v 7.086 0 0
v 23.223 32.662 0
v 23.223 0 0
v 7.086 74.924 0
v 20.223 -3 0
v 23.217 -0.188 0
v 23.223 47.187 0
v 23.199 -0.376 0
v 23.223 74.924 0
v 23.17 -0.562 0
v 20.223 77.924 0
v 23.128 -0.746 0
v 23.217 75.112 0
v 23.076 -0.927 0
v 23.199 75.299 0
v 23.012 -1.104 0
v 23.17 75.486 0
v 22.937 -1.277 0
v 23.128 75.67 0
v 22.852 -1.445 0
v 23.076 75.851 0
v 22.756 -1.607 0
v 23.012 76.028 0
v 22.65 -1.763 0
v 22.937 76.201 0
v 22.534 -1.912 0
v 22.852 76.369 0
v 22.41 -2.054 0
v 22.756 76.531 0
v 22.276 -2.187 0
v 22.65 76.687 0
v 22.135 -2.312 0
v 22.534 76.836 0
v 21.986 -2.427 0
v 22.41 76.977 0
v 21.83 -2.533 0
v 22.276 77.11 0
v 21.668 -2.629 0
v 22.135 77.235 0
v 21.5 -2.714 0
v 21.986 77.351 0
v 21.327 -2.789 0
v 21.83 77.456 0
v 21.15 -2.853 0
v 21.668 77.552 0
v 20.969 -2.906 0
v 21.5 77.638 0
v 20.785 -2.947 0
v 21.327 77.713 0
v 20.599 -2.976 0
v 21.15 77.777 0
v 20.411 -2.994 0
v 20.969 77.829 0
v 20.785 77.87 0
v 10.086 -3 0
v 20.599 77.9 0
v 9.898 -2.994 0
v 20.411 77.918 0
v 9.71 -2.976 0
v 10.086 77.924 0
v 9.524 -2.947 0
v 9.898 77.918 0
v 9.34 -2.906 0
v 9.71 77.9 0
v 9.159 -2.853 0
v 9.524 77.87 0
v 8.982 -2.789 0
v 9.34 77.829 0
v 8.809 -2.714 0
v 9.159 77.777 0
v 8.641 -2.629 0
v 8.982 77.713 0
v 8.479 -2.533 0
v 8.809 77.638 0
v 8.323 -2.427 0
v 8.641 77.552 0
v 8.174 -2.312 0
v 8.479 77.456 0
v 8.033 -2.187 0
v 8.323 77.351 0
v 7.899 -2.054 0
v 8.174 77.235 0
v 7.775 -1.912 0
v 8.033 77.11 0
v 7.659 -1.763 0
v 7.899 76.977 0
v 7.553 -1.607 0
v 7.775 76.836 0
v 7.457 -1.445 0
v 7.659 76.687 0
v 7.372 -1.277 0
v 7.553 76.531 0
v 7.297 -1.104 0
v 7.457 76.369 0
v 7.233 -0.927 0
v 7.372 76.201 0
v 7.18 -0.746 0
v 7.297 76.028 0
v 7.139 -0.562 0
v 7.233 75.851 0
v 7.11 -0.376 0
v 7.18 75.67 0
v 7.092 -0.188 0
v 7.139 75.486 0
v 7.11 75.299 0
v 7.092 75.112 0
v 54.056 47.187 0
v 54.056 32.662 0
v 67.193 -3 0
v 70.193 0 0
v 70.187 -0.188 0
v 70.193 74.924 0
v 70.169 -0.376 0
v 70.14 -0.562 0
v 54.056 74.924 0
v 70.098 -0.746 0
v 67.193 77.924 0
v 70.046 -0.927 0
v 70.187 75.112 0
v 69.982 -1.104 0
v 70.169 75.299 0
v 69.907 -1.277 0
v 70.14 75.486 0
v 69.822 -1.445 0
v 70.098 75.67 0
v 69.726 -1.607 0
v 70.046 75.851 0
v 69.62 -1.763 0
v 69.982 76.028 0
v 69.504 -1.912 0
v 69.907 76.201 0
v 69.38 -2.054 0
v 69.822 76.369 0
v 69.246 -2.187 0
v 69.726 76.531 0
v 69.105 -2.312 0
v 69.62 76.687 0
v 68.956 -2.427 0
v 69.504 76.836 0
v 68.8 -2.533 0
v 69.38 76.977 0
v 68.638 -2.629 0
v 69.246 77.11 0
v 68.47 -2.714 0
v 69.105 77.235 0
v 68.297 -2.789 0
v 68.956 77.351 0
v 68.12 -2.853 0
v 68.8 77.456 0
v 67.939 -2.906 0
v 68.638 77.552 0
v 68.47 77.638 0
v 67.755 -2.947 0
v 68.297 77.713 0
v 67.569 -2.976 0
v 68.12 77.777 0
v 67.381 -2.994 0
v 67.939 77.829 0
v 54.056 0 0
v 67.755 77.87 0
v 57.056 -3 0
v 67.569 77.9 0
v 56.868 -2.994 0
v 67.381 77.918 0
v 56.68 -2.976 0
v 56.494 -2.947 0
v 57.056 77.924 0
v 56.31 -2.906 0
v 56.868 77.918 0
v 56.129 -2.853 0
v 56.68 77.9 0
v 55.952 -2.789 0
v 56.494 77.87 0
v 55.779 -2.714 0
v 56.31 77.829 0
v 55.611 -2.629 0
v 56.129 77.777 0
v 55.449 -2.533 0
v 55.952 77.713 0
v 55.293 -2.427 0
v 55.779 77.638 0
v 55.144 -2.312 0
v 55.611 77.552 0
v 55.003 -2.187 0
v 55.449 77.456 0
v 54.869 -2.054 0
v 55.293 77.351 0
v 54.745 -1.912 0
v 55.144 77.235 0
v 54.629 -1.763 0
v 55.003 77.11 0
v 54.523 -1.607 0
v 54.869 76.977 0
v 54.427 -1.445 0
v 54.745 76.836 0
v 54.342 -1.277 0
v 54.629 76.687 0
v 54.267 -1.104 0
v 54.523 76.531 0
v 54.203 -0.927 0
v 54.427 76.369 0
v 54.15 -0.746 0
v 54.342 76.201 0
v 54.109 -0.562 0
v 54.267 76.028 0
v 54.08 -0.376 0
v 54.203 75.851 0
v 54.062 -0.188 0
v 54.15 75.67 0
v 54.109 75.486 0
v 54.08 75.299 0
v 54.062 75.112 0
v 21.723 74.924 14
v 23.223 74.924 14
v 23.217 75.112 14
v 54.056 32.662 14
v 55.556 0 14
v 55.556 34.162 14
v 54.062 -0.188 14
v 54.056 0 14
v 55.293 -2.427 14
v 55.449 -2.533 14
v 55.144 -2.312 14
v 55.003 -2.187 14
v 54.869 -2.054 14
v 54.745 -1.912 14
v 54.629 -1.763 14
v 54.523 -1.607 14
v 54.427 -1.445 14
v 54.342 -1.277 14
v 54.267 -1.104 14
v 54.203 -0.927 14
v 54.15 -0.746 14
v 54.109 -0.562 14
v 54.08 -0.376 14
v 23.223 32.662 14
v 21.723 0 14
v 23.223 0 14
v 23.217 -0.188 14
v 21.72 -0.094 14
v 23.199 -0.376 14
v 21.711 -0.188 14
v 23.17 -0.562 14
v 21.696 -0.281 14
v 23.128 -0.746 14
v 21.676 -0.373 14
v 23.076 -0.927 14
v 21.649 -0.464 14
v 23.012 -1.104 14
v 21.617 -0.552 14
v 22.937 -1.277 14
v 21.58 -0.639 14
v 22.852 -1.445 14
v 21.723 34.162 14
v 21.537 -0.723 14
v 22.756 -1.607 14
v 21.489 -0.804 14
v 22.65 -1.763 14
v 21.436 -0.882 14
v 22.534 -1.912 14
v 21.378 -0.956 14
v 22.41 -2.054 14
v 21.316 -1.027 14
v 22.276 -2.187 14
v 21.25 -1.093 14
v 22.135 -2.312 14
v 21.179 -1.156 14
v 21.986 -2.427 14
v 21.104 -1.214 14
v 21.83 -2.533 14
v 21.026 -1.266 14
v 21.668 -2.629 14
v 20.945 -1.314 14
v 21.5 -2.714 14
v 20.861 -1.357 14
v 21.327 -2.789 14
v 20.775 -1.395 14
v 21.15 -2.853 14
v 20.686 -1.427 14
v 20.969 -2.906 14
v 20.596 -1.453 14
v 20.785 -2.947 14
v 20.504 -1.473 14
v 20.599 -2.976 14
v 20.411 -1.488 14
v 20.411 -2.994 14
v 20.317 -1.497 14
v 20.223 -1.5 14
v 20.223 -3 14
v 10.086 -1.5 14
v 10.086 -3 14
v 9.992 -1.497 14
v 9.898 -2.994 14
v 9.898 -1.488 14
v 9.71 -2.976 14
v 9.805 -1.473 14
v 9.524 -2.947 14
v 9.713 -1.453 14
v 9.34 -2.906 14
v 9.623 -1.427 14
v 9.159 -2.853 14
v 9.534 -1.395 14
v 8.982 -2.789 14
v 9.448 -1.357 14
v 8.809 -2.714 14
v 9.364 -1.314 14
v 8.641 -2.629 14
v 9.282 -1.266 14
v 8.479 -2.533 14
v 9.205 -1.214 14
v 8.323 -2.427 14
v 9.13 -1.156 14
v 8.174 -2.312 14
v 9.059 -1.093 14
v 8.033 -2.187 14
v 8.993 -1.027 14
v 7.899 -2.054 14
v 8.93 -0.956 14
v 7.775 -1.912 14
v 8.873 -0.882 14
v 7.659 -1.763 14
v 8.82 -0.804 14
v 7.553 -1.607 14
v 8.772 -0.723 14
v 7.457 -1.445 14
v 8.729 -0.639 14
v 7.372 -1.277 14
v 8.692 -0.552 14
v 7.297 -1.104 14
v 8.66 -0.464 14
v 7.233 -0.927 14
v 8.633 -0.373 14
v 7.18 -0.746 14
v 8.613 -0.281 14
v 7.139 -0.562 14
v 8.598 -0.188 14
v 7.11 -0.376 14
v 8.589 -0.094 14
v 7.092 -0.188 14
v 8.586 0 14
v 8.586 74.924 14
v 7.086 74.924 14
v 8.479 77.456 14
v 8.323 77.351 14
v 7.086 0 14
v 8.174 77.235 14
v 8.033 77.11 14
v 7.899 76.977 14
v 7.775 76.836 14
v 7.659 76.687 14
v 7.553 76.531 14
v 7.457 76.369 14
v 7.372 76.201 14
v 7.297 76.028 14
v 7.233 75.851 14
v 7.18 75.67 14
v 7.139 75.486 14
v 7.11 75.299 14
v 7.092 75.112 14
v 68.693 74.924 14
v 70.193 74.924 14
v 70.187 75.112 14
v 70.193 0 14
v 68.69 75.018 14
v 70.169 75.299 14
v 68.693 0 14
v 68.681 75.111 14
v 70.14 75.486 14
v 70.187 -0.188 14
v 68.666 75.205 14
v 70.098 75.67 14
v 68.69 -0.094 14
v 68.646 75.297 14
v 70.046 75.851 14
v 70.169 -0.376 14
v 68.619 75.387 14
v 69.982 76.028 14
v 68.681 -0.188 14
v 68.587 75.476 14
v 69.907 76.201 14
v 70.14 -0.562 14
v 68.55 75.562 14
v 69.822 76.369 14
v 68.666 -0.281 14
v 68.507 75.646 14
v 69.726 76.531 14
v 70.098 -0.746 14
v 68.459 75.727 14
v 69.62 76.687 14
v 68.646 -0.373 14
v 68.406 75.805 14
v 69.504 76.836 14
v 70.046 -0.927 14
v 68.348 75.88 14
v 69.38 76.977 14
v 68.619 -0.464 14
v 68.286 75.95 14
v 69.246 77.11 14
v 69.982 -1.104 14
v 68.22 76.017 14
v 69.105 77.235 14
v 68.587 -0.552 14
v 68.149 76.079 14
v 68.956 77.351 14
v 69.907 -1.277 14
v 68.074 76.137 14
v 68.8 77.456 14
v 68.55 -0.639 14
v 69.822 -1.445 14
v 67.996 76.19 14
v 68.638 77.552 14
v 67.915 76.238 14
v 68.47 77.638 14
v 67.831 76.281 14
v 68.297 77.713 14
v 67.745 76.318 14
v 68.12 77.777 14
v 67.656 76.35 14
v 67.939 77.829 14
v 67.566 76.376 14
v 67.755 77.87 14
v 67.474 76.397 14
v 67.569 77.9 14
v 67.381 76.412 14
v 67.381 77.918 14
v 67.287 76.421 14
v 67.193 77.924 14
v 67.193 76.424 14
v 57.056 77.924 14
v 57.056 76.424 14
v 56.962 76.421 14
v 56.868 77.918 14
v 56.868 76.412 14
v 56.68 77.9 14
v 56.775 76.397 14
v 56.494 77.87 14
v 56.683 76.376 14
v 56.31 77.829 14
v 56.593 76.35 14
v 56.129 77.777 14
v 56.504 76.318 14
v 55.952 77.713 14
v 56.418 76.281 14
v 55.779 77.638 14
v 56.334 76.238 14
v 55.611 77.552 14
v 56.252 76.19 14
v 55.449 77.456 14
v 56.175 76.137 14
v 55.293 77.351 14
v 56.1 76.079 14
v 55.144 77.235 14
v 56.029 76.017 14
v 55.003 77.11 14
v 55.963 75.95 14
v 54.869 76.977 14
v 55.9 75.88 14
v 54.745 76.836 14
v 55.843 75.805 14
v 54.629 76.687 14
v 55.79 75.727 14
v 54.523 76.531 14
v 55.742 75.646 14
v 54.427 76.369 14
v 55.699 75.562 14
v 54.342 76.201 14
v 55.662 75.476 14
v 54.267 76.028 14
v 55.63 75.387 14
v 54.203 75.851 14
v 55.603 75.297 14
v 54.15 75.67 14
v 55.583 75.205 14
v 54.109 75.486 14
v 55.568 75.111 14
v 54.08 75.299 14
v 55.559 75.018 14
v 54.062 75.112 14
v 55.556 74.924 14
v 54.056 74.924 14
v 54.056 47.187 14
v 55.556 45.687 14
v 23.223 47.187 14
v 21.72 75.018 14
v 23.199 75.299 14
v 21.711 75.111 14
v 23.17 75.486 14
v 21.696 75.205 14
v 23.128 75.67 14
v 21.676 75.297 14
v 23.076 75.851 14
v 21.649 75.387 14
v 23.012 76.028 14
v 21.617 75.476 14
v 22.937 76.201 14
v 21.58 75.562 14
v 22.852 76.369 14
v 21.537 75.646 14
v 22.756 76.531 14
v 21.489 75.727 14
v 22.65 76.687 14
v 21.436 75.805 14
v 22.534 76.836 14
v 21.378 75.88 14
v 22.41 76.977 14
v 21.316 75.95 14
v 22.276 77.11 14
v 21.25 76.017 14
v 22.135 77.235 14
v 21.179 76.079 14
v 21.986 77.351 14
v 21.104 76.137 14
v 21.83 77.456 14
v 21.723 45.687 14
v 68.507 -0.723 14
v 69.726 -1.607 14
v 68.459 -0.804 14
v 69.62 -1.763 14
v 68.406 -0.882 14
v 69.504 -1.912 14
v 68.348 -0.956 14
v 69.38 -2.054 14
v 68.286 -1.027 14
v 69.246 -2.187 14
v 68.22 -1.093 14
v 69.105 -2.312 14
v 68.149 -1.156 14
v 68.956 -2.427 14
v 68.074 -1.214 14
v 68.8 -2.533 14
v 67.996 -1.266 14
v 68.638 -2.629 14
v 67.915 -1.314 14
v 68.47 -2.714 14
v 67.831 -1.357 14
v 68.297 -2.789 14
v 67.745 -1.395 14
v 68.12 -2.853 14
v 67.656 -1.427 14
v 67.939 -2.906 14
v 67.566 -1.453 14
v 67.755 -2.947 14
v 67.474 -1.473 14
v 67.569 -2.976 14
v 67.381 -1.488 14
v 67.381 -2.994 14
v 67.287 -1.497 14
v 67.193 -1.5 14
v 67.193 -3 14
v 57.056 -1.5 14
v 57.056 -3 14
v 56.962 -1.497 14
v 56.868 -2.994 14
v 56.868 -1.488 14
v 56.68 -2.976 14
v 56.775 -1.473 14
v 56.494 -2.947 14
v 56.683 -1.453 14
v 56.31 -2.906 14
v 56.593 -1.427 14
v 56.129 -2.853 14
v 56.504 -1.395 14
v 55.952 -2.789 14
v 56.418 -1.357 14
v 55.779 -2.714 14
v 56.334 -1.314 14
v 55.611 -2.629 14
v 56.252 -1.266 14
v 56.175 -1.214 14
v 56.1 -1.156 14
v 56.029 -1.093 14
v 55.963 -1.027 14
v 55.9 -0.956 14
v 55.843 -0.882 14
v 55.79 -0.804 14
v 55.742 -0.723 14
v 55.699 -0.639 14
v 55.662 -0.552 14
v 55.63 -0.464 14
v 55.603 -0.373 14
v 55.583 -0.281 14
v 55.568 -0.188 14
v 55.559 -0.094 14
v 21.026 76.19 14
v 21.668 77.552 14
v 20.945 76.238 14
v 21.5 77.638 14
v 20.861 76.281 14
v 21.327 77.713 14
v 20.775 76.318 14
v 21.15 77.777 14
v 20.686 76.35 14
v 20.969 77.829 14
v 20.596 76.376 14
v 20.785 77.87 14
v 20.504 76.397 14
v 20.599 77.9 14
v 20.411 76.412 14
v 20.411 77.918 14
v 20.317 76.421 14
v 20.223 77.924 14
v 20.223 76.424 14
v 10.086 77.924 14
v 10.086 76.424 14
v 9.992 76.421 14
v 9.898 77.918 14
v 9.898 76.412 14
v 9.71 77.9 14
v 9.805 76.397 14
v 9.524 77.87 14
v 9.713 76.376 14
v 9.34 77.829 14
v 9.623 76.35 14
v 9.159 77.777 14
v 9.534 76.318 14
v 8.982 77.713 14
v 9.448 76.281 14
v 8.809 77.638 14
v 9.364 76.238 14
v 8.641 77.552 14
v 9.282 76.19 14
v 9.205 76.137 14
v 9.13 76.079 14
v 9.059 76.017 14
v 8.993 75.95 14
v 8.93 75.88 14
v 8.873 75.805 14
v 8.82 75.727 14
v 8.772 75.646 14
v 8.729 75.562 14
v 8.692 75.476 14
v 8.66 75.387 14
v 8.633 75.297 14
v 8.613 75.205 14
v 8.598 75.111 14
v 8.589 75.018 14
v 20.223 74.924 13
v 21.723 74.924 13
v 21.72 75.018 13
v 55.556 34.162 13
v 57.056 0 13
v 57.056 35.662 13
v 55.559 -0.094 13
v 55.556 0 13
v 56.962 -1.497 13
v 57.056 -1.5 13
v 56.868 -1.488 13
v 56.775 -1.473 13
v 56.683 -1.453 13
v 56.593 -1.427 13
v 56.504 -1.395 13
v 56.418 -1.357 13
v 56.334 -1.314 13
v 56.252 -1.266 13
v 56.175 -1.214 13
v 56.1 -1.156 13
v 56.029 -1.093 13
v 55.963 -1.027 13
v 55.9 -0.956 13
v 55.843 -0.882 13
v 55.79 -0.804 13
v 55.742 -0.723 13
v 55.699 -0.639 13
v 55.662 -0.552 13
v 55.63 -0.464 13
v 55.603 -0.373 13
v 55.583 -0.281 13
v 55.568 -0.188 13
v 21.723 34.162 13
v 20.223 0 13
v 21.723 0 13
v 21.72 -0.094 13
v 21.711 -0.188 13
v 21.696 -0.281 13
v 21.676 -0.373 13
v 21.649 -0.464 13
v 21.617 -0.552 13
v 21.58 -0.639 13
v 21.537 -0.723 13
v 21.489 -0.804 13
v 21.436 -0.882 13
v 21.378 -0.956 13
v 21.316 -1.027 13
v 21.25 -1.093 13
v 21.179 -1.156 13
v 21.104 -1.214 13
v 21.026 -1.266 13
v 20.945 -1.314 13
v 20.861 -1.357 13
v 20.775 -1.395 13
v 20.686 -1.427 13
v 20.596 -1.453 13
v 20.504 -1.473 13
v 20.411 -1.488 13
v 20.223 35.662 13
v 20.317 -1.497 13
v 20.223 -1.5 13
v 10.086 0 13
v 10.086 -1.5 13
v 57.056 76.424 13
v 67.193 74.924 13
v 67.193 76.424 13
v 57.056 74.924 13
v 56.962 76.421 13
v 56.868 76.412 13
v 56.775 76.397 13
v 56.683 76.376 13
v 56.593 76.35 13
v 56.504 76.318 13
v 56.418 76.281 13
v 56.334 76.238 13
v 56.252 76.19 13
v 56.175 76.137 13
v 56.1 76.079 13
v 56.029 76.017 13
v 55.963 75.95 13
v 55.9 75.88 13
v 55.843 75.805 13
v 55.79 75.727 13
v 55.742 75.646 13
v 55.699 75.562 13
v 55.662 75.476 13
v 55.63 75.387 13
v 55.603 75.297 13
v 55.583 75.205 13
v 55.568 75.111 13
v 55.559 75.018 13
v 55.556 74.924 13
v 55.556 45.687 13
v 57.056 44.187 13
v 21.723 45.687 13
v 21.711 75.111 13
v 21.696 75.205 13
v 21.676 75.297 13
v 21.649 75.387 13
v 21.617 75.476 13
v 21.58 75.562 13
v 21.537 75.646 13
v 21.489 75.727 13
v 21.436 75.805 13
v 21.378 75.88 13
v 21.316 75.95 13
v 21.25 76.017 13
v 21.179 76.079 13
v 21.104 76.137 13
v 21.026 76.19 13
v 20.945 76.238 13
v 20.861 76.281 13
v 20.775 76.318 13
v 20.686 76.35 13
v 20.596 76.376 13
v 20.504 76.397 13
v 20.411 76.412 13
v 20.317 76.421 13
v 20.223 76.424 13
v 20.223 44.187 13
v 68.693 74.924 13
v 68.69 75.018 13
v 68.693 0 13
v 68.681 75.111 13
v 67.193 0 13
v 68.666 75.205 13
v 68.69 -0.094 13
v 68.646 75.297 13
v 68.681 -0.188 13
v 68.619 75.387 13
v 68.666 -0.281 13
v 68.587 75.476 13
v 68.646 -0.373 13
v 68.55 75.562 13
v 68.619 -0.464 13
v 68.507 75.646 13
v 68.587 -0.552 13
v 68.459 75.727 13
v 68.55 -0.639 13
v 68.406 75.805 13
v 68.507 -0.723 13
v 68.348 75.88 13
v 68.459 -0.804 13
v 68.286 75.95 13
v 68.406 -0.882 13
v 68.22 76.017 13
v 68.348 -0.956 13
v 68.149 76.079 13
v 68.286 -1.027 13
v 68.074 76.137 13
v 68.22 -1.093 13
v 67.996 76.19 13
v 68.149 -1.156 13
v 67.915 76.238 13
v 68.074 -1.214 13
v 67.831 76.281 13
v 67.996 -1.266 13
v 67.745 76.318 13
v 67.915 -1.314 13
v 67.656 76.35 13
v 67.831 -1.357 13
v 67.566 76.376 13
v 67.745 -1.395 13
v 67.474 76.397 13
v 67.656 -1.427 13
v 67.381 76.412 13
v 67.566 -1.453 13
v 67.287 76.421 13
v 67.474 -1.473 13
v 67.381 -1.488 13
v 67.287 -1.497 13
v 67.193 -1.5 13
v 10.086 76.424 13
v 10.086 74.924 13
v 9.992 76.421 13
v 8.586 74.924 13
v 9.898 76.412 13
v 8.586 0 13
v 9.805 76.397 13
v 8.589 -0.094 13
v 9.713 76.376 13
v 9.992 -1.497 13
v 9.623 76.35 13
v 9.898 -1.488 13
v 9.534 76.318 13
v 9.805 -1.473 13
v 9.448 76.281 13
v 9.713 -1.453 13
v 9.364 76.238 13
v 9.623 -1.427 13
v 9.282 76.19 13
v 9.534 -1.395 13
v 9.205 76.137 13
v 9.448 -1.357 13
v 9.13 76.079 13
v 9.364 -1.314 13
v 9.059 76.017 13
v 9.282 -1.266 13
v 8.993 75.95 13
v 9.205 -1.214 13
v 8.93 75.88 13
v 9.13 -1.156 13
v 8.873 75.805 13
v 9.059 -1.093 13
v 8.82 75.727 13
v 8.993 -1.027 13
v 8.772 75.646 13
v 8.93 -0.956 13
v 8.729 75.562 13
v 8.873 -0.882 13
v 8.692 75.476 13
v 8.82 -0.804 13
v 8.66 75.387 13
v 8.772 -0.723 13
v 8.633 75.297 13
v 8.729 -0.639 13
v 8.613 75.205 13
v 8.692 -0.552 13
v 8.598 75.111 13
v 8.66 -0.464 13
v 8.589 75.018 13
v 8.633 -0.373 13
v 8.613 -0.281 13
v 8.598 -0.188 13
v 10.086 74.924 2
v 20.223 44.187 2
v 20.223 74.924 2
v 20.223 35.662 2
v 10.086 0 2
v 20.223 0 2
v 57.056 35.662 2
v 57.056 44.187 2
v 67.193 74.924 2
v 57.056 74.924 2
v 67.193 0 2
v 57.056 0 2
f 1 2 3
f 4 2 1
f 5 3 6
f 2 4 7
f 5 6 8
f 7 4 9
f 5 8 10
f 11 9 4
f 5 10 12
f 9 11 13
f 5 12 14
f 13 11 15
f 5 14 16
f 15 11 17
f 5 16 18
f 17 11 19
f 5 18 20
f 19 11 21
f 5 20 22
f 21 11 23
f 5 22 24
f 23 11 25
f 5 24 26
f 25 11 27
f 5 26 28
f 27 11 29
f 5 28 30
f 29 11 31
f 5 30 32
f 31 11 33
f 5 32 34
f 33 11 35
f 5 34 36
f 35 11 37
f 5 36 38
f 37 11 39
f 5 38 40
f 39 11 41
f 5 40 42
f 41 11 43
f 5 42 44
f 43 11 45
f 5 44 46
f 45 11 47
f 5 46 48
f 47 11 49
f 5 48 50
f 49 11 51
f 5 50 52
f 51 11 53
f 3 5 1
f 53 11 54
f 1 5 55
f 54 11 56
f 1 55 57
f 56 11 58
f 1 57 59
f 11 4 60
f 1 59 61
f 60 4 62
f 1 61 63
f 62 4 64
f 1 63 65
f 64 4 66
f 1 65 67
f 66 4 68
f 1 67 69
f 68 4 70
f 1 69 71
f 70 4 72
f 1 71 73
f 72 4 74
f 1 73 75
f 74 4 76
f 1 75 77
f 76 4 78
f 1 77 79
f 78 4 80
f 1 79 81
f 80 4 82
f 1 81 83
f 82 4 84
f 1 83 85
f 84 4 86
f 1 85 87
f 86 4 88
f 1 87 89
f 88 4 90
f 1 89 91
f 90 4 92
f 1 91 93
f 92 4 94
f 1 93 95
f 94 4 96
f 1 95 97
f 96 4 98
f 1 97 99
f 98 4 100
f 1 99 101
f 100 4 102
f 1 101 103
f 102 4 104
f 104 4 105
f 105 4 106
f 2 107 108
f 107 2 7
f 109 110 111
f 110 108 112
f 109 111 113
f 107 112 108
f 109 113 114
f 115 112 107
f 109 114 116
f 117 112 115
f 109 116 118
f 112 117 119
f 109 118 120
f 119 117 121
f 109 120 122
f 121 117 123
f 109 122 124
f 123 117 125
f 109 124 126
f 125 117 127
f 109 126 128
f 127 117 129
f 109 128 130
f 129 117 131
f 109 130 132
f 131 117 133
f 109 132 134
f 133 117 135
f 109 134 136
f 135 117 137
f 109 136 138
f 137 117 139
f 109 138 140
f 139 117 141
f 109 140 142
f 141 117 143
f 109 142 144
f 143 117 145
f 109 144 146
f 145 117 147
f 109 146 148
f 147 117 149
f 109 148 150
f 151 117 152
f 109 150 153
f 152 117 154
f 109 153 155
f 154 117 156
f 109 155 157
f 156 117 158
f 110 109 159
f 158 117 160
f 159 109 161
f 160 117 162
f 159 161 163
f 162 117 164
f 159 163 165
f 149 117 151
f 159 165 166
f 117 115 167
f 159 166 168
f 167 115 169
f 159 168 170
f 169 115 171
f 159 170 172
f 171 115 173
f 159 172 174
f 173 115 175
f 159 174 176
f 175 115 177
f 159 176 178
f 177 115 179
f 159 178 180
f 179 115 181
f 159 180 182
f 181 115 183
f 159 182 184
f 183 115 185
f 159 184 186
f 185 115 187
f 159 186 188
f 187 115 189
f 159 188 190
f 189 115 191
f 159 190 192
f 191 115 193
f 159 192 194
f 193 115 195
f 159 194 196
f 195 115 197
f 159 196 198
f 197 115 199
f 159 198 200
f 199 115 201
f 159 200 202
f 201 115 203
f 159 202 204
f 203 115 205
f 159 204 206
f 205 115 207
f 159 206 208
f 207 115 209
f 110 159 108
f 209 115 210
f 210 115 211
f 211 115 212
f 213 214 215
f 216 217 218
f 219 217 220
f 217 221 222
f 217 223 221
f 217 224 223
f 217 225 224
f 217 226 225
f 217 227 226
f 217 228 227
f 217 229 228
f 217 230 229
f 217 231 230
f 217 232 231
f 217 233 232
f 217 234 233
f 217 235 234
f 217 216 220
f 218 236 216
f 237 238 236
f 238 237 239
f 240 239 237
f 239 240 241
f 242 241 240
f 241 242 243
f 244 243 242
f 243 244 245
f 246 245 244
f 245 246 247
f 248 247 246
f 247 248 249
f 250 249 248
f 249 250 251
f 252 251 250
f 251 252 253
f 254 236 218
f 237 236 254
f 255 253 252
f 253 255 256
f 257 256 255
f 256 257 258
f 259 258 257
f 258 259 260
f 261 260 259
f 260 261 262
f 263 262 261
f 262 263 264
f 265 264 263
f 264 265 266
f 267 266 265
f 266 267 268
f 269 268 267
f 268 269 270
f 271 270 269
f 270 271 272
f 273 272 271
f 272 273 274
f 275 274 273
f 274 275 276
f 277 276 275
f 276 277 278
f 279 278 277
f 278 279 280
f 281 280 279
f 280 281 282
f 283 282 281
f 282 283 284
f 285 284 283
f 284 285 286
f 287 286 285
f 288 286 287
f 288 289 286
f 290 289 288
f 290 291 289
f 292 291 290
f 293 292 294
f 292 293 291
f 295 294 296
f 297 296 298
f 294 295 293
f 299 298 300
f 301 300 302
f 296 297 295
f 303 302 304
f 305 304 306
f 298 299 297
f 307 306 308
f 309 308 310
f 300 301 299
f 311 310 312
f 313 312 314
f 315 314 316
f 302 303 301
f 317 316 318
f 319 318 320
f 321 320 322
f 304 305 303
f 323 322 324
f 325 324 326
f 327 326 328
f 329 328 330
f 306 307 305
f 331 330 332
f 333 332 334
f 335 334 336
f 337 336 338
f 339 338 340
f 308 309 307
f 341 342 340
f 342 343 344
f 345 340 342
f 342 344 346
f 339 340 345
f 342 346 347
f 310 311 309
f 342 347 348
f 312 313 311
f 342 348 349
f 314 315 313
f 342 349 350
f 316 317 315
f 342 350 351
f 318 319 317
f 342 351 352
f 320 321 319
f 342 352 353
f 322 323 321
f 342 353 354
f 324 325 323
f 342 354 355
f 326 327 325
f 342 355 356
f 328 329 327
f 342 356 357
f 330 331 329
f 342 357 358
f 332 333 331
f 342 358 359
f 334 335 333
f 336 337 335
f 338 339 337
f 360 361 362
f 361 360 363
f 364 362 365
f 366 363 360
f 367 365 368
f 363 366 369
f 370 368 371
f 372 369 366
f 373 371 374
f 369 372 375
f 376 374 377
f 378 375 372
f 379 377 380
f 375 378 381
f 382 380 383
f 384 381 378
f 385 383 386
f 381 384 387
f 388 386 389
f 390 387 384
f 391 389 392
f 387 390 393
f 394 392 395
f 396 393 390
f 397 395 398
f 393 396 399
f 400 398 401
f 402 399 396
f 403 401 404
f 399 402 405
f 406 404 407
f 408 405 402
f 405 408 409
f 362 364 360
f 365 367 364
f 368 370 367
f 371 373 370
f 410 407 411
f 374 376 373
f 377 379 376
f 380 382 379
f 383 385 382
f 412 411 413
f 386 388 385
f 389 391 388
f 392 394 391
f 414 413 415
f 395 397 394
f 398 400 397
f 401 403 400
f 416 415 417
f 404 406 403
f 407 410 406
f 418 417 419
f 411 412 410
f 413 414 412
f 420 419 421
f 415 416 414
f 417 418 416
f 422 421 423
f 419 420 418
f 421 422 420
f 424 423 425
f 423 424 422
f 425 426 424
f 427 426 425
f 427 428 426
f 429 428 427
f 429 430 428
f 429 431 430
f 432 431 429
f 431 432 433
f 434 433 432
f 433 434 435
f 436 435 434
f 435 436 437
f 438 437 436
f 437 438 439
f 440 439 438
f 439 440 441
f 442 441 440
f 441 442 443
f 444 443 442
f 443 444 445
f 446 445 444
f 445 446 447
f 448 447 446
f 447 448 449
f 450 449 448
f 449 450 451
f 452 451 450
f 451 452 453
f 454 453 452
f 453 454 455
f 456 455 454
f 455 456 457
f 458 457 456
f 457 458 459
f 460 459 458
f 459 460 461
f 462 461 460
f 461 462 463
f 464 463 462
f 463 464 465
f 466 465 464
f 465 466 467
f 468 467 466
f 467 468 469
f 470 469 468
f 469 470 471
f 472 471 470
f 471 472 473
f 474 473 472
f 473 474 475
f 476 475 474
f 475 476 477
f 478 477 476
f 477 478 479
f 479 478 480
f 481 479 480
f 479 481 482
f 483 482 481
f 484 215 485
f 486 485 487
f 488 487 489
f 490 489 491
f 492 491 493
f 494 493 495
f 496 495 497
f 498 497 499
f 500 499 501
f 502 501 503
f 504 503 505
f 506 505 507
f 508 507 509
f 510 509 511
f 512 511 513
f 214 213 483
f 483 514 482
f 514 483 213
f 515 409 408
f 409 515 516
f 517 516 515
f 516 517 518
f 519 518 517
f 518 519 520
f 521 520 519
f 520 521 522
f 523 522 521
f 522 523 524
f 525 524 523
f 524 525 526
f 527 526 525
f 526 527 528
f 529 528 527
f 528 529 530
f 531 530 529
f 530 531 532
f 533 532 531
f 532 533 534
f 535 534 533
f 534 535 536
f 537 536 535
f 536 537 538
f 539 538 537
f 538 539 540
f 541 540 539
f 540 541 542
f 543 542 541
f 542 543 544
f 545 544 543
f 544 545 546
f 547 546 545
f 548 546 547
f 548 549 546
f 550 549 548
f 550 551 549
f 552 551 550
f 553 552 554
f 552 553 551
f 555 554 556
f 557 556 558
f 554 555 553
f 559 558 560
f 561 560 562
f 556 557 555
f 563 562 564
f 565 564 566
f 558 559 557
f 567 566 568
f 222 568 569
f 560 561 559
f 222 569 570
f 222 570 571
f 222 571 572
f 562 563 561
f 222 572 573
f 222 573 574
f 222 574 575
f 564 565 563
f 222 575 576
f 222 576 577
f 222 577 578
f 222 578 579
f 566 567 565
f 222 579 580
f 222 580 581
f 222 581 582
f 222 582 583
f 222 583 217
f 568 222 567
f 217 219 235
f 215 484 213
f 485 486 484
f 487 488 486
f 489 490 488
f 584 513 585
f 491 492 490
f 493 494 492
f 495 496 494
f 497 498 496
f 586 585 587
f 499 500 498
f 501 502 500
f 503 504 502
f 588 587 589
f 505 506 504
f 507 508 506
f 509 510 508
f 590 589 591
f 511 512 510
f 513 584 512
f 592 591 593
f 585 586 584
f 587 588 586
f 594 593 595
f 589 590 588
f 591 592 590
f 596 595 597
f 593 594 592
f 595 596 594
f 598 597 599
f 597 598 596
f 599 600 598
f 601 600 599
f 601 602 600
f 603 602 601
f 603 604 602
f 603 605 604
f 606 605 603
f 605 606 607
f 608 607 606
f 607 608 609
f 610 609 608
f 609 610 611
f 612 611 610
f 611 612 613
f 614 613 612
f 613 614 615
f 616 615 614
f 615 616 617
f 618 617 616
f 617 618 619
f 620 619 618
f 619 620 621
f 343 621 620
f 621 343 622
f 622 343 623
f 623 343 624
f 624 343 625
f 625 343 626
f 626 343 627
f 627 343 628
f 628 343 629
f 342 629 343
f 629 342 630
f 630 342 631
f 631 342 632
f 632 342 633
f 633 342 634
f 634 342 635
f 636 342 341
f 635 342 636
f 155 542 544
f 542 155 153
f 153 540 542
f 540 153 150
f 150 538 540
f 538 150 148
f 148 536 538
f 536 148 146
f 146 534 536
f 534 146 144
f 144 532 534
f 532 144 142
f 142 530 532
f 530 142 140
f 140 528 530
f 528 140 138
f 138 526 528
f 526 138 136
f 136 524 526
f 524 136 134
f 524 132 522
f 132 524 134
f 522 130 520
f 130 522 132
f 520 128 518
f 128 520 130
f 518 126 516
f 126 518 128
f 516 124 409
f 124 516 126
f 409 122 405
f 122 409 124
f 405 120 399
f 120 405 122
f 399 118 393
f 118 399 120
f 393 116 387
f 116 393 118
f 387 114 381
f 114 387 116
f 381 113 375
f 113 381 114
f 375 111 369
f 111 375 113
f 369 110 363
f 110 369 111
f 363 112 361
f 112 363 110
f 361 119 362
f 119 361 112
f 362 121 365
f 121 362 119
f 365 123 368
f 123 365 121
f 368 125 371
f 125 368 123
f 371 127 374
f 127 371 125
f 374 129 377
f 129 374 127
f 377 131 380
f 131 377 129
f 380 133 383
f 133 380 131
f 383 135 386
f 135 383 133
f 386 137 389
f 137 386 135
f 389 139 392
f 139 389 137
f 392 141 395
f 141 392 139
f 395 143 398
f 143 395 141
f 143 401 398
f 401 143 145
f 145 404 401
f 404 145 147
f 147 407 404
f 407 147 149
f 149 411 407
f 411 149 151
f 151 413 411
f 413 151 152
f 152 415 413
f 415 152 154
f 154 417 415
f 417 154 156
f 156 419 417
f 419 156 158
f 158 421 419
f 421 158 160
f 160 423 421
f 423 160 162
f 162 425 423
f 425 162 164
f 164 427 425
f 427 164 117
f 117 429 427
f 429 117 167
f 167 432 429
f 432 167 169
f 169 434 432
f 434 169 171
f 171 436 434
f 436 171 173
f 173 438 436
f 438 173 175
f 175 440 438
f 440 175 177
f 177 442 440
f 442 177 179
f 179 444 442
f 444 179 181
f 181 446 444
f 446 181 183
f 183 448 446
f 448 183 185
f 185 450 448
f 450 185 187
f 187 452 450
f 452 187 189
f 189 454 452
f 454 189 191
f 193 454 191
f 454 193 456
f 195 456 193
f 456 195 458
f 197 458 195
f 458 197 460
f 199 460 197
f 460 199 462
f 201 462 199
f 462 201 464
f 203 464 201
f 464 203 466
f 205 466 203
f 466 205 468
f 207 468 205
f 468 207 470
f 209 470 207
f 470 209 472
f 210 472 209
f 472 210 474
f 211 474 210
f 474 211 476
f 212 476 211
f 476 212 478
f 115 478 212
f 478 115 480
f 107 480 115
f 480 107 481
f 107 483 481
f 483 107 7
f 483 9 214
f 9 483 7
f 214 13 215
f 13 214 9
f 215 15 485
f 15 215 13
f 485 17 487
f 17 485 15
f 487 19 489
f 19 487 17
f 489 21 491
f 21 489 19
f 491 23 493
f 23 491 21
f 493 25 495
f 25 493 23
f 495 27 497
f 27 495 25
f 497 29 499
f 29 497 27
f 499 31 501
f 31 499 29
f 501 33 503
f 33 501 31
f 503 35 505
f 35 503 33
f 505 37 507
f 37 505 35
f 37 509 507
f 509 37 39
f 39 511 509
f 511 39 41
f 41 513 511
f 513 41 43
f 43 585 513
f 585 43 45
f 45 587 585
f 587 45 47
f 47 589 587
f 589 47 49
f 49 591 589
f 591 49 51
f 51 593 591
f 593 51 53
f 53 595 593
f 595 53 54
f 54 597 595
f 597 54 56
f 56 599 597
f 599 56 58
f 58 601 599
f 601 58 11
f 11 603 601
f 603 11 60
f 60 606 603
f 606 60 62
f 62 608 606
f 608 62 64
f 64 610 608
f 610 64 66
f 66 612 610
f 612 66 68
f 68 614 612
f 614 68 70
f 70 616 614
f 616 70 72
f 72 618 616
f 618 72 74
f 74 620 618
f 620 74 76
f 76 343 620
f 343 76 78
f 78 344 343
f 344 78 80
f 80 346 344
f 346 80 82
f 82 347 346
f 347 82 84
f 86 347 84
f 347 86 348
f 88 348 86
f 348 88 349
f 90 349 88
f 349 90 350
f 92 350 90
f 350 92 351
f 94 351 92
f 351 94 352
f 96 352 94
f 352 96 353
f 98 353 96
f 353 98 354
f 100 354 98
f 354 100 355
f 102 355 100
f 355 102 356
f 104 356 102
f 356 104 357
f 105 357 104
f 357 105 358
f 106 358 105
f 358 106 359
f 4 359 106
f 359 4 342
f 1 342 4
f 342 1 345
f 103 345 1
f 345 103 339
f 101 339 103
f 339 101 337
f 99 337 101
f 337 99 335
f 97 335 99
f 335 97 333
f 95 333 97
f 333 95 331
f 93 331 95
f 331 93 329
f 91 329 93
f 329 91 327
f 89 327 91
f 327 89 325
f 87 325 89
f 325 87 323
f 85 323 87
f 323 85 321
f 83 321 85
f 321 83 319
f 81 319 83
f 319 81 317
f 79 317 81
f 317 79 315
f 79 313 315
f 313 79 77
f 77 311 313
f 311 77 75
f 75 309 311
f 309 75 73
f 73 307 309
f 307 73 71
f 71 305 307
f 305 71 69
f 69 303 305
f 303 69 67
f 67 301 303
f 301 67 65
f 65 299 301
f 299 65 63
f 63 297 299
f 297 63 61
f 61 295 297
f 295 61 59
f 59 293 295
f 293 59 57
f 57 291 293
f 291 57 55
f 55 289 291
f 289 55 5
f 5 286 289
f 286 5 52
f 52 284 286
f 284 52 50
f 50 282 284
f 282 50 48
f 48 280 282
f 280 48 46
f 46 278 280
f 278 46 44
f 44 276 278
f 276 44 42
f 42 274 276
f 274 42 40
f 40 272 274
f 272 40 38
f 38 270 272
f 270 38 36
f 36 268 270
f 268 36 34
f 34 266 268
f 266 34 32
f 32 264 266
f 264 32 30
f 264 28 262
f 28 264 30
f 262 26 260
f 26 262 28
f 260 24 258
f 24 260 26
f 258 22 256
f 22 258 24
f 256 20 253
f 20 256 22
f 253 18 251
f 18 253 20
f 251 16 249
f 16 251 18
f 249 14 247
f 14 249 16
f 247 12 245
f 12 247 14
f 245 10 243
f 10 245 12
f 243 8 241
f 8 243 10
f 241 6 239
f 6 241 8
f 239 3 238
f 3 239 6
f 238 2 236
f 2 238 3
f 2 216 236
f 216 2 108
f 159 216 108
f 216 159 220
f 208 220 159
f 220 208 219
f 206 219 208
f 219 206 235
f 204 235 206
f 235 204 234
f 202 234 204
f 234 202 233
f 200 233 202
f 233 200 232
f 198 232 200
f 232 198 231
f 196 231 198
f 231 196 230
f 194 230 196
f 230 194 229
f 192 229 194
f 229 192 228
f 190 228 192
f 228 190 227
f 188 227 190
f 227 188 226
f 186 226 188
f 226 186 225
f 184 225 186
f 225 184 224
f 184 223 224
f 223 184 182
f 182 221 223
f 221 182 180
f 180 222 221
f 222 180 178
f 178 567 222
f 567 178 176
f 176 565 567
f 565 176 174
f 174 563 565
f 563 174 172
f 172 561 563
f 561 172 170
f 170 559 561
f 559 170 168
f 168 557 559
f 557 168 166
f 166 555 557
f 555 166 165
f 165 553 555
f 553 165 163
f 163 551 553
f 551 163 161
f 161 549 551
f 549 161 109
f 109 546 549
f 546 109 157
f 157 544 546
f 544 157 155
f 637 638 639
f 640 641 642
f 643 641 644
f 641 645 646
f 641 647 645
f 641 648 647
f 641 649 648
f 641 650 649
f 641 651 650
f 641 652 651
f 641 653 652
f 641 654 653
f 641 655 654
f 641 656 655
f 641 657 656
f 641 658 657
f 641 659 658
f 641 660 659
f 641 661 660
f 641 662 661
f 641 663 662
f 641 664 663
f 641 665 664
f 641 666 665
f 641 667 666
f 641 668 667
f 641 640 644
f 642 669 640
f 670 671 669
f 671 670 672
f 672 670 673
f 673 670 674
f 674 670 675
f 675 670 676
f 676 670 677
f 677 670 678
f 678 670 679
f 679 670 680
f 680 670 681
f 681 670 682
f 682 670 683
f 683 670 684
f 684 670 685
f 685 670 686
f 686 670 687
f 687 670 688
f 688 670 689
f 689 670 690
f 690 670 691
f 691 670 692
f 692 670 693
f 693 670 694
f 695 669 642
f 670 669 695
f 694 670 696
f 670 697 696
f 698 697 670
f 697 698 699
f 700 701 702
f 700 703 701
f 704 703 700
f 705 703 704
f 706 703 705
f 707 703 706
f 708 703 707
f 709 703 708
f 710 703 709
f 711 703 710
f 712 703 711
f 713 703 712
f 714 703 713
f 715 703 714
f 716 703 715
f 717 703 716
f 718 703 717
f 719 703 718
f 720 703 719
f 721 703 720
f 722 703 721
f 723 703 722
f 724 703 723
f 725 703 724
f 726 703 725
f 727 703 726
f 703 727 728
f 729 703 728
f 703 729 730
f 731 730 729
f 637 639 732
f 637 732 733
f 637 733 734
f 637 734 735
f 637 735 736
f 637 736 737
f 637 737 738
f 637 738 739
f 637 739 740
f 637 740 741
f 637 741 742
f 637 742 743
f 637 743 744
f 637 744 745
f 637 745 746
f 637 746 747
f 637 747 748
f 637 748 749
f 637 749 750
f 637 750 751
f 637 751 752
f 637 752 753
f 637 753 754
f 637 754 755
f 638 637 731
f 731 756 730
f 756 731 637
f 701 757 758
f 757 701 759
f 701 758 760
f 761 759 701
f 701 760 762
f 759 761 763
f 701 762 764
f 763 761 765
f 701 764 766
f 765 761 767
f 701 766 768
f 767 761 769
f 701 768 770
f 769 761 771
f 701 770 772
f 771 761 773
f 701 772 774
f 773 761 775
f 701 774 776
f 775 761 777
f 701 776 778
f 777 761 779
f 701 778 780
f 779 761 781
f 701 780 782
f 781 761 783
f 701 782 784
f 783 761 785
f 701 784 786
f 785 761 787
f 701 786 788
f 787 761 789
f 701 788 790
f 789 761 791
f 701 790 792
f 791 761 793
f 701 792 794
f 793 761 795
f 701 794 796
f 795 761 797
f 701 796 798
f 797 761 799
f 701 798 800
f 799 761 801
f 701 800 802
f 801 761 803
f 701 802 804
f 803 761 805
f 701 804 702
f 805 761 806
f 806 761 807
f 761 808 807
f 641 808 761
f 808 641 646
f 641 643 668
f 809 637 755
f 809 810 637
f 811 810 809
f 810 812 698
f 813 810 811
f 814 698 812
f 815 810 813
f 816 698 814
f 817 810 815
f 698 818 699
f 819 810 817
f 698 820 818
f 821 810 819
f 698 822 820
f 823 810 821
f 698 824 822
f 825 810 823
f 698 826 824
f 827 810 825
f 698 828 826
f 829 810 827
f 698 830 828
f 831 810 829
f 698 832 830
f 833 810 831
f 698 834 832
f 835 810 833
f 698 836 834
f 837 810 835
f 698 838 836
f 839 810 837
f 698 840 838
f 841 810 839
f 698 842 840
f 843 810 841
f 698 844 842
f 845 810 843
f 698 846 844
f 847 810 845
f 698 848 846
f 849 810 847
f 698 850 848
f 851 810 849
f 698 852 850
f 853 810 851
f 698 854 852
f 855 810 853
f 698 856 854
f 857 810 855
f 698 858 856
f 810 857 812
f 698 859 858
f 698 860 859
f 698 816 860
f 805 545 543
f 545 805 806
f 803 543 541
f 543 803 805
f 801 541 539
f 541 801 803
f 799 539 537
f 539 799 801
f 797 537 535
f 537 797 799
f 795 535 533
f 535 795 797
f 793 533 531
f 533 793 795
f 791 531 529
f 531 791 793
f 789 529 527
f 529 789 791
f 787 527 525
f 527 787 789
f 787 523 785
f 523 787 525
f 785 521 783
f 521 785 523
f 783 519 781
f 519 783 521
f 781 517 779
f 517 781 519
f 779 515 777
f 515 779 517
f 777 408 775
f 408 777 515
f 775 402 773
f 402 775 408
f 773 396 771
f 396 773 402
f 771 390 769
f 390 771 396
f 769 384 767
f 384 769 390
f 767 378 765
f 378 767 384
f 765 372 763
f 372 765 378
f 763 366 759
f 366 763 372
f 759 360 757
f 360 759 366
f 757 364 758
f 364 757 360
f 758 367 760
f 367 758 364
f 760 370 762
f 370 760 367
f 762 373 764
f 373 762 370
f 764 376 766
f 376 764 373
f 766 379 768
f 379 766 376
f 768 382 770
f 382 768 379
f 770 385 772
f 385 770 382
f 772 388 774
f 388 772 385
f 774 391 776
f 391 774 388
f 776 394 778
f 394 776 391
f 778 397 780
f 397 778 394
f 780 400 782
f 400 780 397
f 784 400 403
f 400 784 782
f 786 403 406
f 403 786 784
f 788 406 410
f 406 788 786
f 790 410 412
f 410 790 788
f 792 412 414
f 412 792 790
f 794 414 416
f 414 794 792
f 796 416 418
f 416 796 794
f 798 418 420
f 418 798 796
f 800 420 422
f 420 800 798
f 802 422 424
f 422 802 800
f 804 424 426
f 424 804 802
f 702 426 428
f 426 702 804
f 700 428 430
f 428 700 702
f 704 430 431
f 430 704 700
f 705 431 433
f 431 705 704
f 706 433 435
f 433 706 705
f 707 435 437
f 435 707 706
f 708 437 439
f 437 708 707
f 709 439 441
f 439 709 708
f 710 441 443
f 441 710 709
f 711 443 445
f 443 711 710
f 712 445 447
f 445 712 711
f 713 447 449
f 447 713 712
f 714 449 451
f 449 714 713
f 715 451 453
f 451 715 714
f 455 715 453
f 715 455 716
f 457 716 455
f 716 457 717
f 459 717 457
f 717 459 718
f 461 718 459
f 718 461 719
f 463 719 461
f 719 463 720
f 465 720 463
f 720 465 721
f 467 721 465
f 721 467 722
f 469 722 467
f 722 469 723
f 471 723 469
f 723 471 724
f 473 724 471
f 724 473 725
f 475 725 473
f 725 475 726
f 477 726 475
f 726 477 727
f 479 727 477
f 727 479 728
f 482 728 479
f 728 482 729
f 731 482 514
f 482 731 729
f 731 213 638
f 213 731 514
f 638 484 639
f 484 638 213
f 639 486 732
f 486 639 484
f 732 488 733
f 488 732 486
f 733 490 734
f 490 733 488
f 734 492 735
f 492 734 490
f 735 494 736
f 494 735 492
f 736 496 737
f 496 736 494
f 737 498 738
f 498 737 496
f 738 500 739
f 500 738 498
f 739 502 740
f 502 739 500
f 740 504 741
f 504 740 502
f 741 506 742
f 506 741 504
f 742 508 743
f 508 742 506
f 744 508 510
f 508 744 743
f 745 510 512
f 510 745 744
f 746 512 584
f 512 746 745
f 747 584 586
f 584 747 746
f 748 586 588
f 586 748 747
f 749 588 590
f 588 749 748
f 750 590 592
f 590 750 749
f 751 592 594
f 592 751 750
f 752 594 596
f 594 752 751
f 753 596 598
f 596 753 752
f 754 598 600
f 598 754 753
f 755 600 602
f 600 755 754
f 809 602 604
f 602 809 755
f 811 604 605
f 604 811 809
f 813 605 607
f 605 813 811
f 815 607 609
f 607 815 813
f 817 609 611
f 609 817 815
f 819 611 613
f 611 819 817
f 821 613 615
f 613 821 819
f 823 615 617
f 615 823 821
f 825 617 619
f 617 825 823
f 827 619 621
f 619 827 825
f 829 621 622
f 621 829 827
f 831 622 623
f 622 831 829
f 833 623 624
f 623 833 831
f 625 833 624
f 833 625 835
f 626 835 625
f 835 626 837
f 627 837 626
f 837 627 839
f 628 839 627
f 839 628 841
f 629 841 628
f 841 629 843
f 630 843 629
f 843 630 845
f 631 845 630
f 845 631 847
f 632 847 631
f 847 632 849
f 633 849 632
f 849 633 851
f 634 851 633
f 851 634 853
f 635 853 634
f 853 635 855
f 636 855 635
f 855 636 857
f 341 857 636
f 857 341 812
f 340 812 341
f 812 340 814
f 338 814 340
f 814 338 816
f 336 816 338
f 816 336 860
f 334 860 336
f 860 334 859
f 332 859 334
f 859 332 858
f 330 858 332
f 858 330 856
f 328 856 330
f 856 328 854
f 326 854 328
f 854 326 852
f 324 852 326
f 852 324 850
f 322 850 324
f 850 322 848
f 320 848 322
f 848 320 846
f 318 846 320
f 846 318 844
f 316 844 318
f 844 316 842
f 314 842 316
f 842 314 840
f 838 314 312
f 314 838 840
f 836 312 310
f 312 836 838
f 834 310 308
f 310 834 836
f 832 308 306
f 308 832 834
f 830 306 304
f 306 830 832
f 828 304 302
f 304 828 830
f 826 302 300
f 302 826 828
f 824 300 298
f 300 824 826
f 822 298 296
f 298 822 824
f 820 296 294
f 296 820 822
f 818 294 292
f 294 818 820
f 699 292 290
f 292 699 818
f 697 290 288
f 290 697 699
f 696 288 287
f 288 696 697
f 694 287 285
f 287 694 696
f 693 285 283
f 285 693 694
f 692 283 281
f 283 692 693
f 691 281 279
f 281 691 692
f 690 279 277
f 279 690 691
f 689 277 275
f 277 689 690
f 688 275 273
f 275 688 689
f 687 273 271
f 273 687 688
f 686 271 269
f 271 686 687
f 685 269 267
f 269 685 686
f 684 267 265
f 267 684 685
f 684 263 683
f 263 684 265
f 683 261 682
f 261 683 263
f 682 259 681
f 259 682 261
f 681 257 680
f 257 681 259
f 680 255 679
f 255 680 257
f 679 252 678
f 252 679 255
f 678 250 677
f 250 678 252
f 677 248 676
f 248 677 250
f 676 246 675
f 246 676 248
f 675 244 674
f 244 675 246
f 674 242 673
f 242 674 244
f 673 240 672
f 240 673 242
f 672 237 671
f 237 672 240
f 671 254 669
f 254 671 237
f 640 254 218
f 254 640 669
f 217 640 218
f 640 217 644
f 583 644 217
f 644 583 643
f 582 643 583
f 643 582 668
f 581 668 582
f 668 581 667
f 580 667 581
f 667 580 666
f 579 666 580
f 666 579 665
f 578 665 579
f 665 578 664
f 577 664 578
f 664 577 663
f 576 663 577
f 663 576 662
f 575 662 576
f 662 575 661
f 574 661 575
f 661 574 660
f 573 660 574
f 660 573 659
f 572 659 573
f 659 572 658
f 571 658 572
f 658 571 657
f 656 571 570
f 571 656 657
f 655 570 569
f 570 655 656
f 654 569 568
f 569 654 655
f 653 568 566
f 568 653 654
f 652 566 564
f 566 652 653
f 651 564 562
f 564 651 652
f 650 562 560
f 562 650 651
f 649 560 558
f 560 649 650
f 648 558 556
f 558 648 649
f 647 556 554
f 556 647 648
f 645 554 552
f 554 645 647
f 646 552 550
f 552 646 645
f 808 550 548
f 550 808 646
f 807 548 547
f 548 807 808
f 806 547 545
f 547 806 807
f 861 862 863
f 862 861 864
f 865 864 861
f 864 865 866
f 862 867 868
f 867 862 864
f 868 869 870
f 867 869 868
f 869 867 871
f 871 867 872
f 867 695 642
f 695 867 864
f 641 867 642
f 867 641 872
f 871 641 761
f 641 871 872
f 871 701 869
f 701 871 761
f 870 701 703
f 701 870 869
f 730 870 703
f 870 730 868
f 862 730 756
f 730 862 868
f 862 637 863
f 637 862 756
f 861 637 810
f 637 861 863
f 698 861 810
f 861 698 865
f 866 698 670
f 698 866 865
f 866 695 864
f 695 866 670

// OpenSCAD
//Sign body maker V3 - bigclivedotcom
letter = "H"; //Sign character to make
style = "Noto Mono"; //See "Help" and "Font List"
size = 80; //Size of character (height)
depth = 14; //Depth of sign character
$fn=100; //Curve facets - higher is smoother
walls = 3; //Side wall thickness
base=2; //Base thickness (-1 for open back)
face = 1; //Face thickness
//Don't change variables below here
sized=size-(2*walls);
difference(){
     linear_extrude(height=depth)
	  minkowski(){
	  text(letter,sized,style);
	  circle(walls);
     }
//Lip for front face (half wall thickness)
     translate([0,0,depth-face])
	  linear_extrude(height=2*face)
	  minkowski(){
	  text(letter,sized,style);
	  circle(walls/2);
     }
//hollow core of letter
     translate([0,0,base])
	  linear_extrude(height=depth+2)
	  text(letter,sized,style);
}
